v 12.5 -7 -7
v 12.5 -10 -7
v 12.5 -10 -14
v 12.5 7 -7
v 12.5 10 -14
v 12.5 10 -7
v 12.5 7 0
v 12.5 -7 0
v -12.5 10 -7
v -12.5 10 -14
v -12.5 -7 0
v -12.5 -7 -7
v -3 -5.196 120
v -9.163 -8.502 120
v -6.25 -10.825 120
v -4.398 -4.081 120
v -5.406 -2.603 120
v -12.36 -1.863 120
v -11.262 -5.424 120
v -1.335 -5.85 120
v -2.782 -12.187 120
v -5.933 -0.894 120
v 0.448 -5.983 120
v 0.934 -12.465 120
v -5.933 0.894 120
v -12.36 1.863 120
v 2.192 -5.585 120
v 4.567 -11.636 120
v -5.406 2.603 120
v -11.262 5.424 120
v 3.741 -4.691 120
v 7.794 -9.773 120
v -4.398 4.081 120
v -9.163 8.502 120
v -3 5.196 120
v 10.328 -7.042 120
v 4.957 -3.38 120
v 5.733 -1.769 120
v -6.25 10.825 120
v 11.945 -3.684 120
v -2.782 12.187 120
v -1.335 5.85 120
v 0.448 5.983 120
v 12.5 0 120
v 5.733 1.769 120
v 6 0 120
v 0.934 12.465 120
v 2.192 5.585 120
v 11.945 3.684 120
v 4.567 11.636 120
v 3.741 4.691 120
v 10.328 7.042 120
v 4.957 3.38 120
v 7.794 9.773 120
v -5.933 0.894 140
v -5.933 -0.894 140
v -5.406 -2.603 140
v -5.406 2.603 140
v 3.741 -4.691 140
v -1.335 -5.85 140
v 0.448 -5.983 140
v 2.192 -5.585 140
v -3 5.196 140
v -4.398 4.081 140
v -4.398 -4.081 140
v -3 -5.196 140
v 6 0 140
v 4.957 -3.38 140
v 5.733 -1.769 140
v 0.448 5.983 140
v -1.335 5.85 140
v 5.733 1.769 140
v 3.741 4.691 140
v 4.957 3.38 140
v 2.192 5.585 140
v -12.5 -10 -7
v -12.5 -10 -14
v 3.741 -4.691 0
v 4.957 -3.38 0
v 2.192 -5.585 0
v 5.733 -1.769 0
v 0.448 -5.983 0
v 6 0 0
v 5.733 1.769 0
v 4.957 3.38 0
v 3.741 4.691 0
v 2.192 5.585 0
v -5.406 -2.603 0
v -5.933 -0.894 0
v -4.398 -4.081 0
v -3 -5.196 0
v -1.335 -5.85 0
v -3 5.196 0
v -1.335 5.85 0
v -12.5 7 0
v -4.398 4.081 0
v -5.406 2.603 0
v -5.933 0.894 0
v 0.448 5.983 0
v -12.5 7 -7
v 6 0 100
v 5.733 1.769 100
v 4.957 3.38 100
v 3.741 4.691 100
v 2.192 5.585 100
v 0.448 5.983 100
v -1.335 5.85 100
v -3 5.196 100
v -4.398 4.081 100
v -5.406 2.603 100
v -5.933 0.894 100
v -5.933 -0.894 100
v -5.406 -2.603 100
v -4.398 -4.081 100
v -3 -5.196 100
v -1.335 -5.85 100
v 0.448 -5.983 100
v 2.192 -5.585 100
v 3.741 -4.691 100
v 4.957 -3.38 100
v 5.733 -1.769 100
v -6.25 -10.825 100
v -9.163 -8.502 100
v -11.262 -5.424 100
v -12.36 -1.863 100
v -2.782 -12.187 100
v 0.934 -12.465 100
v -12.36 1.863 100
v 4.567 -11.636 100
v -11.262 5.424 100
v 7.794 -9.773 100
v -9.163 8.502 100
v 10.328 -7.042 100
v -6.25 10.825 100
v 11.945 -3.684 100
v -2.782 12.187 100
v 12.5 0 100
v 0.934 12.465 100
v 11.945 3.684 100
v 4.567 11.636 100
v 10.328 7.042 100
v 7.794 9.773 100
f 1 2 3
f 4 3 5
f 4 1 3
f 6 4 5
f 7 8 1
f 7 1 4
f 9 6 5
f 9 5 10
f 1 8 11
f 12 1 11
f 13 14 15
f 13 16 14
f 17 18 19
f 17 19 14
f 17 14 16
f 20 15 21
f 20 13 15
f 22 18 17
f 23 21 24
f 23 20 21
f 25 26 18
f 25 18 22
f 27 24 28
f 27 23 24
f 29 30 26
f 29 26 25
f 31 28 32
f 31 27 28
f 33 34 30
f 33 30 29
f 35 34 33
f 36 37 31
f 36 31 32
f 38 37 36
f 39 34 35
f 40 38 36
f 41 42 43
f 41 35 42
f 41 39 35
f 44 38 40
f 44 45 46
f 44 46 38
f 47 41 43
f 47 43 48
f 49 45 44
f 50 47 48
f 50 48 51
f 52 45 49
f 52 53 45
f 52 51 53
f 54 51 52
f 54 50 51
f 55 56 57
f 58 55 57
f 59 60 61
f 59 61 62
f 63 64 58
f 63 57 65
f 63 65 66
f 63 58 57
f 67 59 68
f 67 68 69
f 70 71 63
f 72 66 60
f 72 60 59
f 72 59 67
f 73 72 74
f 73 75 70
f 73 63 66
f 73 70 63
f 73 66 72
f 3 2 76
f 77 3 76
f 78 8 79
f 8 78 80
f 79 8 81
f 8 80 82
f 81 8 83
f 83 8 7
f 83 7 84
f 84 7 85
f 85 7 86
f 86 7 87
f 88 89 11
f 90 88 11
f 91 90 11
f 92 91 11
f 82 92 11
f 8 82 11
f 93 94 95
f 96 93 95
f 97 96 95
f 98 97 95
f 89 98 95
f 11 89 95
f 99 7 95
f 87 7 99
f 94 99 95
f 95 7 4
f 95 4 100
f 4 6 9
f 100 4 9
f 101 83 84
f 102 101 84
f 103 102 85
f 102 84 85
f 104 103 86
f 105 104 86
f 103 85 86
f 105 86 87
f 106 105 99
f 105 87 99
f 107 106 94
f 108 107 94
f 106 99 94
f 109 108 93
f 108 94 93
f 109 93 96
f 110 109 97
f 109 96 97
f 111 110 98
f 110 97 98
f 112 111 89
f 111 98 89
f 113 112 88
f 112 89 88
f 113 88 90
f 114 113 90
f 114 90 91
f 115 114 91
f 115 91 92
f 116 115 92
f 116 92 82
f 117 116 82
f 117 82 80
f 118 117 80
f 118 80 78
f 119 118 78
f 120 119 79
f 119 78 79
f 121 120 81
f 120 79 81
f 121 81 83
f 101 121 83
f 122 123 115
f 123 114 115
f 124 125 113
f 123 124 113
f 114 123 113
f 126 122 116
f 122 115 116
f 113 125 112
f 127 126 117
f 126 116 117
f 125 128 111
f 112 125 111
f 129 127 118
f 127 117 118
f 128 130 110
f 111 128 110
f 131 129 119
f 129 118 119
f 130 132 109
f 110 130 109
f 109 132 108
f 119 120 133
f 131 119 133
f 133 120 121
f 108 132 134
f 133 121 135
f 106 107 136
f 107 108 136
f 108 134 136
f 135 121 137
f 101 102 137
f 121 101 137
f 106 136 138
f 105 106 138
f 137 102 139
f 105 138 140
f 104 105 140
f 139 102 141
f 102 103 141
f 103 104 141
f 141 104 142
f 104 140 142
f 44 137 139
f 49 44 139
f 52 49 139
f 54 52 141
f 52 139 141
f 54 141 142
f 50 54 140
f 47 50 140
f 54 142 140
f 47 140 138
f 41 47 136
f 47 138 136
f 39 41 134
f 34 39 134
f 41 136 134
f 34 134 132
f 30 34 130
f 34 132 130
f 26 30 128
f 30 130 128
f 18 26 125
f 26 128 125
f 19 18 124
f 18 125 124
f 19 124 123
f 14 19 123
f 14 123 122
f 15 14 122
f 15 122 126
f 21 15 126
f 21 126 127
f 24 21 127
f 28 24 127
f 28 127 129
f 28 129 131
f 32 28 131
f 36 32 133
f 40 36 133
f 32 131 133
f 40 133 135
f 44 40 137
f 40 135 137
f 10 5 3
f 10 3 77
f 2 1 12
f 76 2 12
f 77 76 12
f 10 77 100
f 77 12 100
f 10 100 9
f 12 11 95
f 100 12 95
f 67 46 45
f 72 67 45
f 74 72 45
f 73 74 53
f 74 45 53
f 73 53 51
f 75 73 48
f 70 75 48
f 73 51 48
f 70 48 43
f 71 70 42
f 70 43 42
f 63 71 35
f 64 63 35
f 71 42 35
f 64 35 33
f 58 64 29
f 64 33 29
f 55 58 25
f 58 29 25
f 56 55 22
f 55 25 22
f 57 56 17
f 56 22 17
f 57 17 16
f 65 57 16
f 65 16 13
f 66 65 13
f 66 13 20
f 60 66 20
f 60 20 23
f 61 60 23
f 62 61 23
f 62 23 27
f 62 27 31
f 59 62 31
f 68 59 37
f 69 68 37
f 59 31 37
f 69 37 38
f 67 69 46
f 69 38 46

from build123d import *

# Parameters (mm, degrees)
SKETCH1_R           = 6
BOSS_EXTRUDE1_DEPTH = 100
SKETCH2_R           = 12.5
BOSS_EXTRUDE2_DEPTH = 20
SKETCH3_R           = 6
BOSS_EXTRUDE3_DEPTH = 20
SKETCH4_W           = 25
SKETCH4_H           = 14
BOSS_EXTRUDE4_DEPTH = 7
SKETCH5_W           = 25
SKETCH5_H           = 20
BOSS_EXTRUDE5_DEPTH = 7


with BuildPart() as part:
    # Sketch1 → Boss-Extrude1 (new body)
    with BuildSketch(Plane.XY):
        Circle(SKETCH1_R)
    extrude(amount=BOSS_EXTRUDE1_DEPTH)

    # Sketch2 → Boss-Extrude2 (add)
    with BuildSketch(Plane.XY.offset(100)):
        Circle(SKETCH2_R)
    extrude(amount=BOSS_EXTRUDE2_DEPTH)

    # Sketch3 → Boss-Extrude3 (add)
    with BuildSketch(Plane.XY.offset(120)):
        Circle(SKETCH3_R)
    extrude(amount=BOSS_EXTRUDE3_DEPTH)

    # Sketch4 → Boss-Extrude4 (add)
    with BuildSketch(Plane(origin=(0, 0, 0), x_dir=(-1, 0, 0), z_dir=(0, 0, -1))):
        Rectangle(SKETCH4_W, SKETCH4_H)
    extrude(amount=BOSS_EXTRUDE4_DEPTH)

    # Sketch5 → Boss-Extrude5 (add)
    with BuildSketch(Plane(origin=(0, 0, -7), x_dir=(-1, 0, 0), z_dir=(0, 0, -1))):
        Rectangle(SKETCH5_W, SKETCH5_H)
    extrude(amount=BOSS_EXTRUDE5_DEPTH)


solid = part.part
